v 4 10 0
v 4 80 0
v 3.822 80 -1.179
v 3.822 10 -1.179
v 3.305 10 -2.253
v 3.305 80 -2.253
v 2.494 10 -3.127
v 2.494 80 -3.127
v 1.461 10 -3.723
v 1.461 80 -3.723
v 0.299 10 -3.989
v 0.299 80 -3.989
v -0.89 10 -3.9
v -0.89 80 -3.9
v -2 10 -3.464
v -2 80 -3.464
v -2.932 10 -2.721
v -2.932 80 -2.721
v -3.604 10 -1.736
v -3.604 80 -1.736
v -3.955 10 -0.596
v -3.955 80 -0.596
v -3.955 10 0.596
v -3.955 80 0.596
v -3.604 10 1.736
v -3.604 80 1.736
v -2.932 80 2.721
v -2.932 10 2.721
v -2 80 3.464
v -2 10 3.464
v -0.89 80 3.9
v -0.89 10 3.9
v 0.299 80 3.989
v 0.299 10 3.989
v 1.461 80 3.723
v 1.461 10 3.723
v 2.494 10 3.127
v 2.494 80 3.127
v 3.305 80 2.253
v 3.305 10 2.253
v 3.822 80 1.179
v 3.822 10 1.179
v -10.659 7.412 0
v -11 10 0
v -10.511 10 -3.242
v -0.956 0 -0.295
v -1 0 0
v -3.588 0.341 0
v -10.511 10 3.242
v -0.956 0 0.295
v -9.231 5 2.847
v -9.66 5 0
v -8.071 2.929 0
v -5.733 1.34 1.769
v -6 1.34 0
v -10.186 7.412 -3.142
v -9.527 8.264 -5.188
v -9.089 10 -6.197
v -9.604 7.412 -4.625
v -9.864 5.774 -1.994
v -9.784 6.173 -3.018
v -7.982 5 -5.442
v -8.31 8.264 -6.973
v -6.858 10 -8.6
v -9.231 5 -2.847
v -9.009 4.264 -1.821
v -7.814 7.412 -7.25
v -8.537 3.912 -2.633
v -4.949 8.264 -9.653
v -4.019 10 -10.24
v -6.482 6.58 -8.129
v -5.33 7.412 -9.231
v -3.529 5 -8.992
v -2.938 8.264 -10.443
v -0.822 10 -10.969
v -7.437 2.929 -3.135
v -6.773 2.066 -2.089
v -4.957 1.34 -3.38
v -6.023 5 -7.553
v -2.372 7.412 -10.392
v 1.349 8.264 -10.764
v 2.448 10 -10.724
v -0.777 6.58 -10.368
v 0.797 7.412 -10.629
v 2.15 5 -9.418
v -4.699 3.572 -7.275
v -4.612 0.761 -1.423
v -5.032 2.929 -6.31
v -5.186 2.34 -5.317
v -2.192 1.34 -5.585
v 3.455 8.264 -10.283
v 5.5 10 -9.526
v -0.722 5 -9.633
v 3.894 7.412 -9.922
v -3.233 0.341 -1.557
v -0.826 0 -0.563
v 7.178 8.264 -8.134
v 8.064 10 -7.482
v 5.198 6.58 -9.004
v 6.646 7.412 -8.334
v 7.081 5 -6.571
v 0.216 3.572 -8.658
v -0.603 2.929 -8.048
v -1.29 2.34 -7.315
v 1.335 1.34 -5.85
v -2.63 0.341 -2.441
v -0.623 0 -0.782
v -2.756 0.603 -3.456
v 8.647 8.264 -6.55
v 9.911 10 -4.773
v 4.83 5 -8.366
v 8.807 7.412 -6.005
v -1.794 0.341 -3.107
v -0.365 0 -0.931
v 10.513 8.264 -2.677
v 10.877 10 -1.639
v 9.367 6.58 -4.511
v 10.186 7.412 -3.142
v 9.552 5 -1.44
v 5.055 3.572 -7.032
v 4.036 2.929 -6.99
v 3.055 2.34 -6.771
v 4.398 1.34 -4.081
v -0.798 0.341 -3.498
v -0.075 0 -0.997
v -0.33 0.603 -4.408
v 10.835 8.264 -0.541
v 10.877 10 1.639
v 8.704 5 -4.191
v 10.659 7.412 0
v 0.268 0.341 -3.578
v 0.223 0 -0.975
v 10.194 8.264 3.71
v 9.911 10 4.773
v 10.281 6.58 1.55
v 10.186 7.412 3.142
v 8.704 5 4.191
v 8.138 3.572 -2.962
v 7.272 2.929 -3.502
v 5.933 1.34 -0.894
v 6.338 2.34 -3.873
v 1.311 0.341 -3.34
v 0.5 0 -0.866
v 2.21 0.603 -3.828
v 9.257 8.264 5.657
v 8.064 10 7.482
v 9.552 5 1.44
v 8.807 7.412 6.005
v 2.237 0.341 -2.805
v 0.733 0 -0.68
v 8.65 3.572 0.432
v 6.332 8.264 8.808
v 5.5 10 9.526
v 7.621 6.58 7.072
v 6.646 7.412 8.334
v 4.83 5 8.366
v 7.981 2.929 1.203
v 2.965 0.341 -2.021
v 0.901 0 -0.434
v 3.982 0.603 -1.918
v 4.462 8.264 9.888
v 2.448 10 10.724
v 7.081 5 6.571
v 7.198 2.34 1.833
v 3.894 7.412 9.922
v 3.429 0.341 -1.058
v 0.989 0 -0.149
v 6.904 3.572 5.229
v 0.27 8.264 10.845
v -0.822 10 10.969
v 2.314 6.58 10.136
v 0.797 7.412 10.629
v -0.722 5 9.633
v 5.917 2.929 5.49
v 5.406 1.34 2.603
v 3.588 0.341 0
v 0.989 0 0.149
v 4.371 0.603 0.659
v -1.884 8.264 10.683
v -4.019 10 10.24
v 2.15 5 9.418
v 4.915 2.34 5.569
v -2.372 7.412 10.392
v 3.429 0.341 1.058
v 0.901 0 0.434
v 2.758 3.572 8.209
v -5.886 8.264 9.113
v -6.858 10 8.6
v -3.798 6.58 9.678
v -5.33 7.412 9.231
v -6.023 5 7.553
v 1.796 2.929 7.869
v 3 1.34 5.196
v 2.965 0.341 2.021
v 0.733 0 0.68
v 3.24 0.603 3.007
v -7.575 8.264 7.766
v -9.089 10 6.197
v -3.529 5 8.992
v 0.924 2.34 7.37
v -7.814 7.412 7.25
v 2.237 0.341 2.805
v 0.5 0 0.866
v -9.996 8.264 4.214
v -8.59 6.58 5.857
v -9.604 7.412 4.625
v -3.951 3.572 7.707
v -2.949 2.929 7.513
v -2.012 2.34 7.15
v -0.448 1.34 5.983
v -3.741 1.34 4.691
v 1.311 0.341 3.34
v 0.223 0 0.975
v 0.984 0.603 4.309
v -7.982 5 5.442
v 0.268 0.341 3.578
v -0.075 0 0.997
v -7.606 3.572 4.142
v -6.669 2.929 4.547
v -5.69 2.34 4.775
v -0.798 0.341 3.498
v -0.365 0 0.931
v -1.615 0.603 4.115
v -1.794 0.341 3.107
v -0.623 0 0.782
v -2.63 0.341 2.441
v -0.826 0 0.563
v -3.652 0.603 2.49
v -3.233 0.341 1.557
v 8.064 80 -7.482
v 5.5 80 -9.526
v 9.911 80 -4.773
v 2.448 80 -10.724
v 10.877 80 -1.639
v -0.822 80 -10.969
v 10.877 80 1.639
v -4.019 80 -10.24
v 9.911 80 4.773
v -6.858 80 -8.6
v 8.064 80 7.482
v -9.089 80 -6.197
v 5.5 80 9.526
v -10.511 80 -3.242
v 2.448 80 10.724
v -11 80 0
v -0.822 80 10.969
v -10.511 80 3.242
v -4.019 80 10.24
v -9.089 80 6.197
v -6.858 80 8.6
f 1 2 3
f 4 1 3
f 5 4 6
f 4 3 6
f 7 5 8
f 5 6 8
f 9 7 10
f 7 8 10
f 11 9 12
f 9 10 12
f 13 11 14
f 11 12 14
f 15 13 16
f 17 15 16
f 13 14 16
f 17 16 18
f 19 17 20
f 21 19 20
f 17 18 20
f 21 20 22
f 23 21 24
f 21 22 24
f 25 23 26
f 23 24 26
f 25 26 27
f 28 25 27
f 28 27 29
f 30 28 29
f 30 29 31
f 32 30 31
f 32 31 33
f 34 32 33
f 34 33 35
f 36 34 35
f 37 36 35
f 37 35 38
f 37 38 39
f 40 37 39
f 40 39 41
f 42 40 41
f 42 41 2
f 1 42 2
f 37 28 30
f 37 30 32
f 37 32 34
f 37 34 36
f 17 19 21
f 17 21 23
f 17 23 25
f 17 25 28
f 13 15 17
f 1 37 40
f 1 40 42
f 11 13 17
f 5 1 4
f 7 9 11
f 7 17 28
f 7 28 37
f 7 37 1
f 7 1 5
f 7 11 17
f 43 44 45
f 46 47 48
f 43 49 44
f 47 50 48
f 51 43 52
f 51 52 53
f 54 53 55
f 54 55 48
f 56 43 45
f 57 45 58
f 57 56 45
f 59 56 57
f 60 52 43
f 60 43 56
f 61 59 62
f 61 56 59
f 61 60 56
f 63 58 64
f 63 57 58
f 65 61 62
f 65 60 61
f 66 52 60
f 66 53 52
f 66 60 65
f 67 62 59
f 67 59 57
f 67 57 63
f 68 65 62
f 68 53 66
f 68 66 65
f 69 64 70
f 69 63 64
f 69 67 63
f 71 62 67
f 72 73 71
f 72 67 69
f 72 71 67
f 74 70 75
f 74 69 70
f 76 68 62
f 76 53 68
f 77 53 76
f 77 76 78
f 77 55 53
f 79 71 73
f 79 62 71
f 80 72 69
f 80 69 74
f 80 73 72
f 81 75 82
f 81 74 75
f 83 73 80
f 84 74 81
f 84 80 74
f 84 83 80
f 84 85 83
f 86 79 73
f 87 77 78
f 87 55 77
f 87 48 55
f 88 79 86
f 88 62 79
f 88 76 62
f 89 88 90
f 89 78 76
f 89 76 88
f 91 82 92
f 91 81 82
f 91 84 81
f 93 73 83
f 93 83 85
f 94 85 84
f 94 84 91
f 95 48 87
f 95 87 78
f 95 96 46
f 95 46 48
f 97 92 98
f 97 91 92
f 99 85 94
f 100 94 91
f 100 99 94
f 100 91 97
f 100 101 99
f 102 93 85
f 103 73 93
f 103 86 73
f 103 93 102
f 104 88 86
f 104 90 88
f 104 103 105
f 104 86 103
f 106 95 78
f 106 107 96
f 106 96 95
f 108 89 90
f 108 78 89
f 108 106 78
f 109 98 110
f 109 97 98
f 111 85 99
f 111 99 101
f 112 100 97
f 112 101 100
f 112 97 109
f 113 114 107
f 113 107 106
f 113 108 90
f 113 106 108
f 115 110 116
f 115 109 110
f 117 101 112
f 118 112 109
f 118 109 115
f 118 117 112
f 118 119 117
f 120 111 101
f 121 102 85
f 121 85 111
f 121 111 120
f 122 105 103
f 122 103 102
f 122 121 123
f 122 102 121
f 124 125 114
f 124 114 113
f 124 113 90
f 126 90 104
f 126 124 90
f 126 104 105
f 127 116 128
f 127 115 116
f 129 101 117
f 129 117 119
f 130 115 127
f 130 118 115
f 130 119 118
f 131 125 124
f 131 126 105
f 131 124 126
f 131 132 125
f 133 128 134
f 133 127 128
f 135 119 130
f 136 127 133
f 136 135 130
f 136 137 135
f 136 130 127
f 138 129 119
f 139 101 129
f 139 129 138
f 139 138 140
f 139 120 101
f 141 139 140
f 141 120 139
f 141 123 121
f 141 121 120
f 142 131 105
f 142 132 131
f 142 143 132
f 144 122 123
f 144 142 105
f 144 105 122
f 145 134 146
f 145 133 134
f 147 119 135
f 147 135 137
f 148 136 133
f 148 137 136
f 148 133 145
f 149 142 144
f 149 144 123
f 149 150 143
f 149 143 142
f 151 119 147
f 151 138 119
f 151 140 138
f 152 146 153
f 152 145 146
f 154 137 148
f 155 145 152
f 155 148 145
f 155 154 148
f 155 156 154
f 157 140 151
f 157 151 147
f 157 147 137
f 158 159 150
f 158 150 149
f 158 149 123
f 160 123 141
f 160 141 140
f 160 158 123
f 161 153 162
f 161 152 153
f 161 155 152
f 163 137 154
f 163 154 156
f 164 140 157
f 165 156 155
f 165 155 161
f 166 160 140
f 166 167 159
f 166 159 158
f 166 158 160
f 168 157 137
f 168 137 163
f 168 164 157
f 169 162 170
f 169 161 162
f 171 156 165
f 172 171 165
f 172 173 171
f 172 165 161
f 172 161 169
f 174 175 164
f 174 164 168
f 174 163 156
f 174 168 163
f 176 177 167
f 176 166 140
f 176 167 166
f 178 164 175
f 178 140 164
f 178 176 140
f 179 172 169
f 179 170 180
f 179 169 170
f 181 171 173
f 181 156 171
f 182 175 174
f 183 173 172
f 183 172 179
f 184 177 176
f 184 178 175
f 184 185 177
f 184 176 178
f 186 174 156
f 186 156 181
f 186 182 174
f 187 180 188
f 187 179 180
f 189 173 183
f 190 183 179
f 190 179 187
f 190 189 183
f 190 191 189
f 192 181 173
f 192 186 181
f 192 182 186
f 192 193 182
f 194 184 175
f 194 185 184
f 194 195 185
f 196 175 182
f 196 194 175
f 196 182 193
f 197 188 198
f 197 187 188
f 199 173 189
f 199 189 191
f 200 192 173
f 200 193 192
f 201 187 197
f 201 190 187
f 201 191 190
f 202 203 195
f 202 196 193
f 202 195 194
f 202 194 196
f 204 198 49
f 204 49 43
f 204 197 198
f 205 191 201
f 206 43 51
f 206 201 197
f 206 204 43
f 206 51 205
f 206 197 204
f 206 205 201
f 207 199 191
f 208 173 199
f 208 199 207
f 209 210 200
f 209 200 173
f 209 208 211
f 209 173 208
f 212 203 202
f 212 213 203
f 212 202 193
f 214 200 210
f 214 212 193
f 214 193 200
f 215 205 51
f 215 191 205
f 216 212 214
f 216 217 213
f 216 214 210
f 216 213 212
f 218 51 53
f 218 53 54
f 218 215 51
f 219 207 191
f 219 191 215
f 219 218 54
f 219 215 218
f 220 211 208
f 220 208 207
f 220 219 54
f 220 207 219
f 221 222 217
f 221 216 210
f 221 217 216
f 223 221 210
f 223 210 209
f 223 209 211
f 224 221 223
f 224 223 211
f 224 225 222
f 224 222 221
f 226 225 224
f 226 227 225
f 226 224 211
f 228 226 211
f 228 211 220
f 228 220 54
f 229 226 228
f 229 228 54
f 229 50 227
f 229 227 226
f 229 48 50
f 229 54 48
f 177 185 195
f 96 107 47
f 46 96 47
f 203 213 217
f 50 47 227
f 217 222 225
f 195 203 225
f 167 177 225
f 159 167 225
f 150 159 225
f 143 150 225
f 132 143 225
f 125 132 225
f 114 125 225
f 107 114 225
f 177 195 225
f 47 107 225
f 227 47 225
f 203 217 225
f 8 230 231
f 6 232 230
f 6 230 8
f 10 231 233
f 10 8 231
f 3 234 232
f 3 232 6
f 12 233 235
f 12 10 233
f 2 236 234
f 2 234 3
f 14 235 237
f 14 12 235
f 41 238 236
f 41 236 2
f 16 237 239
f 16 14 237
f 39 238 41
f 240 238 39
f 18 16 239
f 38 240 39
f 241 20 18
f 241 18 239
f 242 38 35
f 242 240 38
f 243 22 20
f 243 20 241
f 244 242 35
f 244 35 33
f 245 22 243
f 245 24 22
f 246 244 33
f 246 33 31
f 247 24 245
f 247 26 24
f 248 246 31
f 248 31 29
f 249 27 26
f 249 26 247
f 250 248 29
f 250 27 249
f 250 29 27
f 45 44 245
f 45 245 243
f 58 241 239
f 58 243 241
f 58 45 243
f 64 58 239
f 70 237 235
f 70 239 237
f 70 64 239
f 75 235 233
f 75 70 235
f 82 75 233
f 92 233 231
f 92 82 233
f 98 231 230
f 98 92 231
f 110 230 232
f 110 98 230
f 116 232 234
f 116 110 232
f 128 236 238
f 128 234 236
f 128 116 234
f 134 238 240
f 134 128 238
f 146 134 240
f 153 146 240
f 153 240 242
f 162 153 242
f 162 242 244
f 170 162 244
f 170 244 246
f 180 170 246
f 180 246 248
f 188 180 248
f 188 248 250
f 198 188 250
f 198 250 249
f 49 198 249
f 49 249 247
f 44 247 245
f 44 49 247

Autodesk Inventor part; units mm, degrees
ref_plane "YZ Plane" through (0, 0, 0) normal (1, 0, 0) x (0, 1, 0)
ref_plane "XZ Plane" through (0, 0, 0) normal (0, 1, 0) x (-1, 0, 0)
ref_plane "XY Plane" through (0, 0, 0) normal (0, 0, 1) x (1, 0, 0)
sketch "Boceto1" plane through (0, 0, 0) normal (0, 1, 0) x (-1, 0, 0)
  circle A0 centre (0, 0) radius 11
  dimension "d0" = 22
extrude "Extrusión1" add sketch "Boceto1" along normal blind 80
fillet "Empalme1" radius 10 1 edges at (11, 0, 0)
sketch "Boceto2" plane through (0, 80, 0) normal (0, 1, 0) x (1, 0, 0)
  point P0 (0, 0)
sketch "Boceto3" plane through (0, 80, 0) normal (0, 1, 0) x (1, 0, 0)
  circle A0 centre (0, 0) radius 4
  dimension "d4" = 8
extrude "Extrusión2" cut sketch "Boceto3" against normal blind 70
properties part number "pieza2 proyecto alternativo"
